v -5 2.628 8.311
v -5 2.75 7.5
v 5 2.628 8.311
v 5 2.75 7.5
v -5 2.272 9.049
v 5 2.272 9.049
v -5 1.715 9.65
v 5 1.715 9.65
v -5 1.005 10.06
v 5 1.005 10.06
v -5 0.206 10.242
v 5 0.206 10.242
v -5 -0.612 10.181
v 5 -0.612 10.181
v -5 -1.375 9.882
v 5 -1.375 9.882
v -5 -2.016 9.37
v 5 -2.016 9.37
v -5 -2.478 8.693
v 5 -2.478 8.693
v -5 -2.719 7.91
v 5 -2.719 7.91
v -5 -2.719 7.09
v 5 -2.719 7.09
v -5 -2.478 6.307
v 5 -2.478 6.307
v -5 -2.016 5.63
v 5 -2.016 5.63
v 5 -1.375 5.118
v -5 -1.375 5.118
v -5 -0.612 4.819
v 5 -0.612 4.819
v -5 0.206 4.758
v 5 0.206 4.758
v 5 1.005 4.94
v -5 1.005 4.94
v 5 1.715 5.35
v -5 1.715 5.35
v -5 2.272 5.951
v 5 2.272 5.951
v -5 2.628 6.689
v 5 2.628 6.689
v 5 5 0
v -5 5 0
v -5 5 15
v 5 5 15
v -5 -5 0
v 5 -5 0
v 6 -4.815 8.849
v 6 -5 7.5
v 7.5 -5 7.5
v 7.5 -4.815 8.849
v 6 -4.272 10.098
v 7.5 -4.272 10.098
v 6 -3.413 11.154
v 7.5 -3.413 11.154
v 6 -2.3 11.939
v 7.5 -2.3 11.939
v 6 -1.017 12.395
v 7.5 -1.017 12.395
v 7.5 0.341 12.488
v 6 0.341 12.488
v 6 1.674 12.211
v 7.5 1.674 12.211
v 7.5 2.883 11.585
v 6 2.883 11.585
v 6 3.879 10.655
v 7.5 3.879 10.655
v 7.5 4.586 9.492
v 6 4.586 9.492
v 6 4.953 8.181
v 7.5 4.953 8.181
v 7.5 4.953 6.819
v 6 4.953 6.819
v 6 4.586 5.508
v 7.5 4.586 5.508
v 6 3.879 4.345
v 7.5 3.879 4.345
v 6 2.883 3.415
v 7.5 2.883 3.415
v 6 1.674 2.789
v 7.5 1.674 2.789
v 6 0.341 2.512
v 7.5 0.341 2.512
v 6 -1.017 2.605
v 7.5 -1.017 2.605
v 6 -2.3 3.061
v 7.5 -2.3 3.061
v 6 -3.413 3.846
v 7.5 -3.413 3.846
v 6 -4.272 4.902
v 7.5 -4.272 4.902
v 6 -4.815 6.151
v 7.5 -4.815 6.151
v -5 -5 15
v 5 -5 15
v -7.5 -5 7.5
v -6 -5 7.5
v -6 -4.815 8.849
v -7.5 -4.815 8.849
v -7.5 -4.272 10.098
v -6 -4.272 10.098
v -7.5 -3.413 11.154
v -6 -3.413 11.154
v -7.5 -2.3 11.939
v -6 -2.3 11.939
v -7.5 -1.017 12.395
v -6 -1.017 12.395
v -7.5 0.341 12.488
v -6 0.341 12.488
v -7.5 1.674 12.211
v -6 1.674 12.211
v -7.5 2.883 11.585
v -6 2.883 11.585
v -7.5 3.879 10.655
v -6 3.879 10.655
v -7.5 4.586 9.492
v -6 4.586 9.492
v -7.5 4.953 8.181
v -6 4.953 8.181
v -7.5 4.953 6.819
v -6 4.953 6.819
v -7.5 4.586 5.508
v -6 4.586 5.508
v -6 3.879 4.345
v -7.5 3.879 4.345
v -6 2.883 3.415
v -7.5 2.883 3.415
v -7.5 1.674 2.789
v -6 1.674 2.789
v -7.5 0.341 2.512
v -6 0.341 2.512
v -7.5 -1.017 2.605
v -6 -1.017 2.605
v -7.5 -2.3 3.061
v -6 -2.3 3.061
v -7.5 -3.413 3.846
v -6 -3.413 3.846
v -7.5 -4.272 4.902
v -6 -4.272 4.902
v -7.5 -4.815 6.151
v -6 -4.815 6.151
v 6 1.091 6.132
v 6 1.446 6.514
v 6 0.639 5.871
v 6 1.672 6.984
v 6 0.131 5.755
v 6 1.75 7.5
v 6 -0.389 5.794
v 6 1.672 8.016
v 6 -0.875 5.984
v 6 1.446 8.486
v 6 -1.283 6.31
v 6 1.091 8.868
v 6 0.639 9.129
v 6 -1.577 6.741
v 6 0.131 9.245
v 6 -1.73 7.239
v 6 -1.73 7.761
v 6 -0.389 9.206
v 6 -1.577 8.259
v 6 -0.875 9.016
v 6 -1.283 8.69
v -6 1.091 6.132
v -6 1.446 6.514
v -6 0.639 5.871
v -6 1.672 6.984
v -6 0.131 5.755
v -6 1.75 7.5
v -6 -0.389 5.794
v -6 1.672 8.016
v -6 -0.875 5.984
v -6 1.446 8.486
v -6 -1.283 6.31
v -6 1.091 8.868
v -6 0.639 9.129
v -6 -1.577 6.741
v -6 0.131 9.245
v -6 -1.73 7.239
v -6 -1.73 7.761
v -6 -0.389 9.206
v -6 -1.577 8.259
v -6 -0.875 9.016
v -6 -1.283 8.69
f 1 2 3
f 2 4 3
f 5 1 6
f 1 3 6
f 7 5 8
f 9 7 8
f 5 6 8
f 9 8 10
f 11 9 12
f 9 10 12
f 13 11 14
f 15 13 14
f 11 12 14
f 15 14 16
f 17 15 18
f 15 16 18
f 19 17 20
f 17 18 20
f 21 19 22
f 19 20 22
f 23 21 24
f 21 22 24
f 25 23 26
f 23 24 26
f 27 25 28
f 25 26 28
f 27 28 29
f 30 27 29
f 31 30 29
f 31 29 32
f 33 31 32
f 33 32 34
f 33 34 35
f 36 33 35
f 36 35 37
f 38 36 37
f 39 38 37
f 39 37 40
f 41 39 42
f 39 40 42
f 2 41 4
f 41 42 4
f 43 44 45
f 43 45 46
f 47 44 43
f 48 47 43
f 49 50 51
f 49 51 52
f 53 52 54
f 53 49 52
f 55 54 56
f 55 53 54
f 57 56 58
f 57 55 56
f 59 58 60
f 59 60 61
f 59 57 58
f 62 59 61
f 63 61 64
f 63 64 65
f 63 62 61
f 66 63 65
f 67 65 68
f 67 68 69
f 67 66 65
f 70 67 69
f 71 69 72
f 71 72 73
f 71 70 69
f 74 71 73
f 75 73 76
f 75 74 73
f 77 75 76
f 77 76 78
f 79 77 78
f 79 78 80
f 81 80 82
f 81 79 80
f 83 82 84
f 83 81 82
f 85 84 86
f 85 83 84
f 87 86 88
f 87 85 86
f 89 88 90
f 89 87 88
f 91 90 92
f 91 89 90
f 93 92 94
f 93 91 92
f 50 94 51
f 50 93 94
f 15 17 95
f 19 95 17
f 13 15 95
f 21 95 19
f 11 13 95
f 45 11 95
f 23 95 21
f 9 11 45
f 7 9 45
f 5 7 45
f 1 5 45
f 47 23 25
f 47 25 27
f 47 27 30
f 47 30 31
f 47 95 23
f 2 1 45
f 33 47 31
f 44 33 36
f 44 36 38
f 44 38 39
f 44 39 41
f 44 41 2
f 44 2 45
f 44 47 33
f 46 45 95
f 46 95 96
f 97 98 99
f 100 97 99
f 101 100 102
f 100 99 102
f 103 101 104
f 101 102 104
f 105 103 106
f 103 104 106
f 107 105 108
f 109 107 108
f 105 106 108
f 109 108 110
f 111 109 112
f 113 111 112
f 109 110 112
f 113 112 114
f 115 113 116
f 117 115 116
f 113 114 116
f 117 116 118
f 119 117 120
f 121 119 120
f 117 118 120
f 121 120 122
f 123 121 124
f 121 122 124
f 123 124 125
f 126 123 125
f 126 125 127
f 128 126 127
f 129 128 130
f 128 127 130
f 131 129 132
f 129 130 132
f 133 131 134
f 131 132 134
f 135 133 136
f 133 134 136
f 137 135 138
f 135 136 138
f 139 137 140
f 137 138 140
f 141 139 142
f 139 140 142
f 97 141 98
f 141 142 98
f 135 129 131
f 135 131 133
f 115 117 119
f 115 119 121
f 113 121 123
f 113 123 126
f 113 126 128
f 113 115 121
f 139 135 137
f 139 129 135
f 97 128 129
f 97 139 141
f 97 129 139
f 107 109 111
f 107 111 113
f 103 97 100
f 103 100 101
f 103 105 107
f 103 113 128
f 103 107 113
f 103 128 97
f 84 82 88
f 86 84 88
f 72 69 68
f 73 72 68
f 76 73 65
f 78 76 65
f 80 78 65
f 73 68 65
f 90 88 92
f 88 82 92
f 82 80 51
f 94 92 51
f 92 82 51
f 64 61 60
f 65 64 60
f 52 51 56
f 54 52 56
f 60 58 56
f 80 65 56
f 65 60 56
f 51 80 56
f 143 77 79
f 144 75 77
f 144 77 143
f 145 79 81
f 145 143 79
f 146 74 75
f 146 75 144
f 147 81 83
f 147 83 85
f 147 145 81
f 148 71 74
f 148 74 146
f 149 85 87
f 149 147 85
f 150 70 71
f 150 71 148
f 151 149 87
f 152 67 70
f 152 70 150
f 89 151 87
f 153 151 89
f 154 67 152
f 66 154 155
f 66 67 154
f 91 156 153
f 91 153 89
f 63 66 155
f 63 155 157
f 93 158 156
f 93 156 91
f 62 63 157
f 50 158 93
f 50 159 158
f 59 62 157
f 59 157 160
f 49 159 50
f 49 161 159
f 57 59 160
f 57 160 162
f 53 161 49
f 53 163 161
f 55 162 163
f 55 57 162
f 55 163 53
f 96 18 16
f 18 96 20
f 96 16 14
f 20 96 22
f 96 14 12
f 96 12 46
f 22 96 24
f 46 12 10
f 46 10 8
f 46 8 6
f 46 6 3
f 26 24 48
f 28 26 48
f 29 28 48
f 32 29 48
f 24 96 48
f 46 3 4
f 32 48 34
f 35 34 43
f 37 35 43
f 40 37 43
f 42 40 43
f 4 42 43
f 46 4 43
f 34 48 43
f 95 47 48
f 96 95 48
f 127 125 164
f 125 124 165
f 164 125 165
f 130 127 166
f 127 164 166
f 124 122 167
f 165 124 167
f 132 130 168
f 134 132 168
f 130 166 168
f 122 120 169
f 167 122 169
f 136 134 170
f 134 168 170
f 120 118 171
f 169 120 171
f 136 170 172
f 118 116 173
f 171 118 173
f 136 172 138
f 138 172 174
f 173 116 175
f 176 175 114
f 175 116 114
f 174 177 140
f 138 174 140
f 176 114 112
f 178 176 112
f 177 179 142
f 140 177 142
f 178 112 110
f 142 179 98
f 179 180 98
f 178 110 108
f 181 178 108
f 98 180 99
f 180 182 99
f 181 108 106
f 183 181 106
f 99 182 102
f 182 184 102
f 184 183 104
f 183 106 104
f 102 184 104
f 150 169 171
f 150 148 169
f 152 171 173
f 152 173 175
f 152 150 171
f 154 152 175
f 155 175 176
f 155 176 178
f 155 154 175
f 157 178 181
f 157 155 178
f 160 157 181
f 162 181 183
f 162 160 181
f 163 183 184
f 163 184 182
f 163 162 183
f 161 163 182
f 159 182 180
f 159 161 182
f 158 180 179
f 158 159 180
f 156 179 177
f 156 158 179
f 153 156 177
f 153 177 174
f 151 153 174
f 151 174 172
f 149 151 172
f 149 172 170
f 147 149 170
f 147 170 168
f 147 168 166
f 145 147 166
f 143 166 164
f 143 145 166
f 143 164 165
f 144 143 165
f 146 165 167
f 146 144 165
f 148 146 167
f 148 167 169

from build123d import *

# Parameters (mm, degrees)
F0_W     = 10
F0_H     = 10
F1_DEPTH = 15
F3_R     = 2.75
F4_DEPTH = 12.5
F5_R     = 1.75
F6_DEPTH = 6
F7_R     = 5
F7_R_2   = 1.75
F8_DEPTH = 1.5


with BuildPart() as f1:
    # F0 (on Top) → F1 (new body)
    with BuildSketch(Plane.XY):
        Rectangle(F0_W, F0_H)
    extrude(amount=F1_DEPTH)

    # F3 (on offset) → F4 (cut, symmetric)
    with BuildSketch(Plane.YZ):
        with Locations((0, 7.5)):
            Circle(F3_R)
    extrude(amount=F4_DEPTH, both=True, mode=Mode.SUBTRACT)


with BuildPart() as f6:
    # F5 (on Right) → F6 (new body, symmetric)
    with BuildSketch(Plane.YZ):
        with Locations((0, 7.5)):
            Circle(F5_R)
    extrude(amount=F6_DEPTH, both=True)

    # F7 (on face) → F8 (join)
    with BuildSketch(Plane(origin=(-6, 0, 0), x_dir=(0, -1, 0), z_dir=(-1, 0, 0))):
        with Locations((0, 7.5)):
            Circle(F7_R)
        with Locations((0, 7.5)):
            Circle(F7_R_2, mode=Mode.SUBTRACT)
        with Locations((0, 7.5)):
            Circle(F7_R_2)
    extrude(amount=F8_DEPTH)

    # F9: F6 across plane


with BuildPart() as f6_1:
    add(f6.part)
    add(f6.part.mirror(Plane.YZ))


solid = Compound([f1.part, f6_1.part])
